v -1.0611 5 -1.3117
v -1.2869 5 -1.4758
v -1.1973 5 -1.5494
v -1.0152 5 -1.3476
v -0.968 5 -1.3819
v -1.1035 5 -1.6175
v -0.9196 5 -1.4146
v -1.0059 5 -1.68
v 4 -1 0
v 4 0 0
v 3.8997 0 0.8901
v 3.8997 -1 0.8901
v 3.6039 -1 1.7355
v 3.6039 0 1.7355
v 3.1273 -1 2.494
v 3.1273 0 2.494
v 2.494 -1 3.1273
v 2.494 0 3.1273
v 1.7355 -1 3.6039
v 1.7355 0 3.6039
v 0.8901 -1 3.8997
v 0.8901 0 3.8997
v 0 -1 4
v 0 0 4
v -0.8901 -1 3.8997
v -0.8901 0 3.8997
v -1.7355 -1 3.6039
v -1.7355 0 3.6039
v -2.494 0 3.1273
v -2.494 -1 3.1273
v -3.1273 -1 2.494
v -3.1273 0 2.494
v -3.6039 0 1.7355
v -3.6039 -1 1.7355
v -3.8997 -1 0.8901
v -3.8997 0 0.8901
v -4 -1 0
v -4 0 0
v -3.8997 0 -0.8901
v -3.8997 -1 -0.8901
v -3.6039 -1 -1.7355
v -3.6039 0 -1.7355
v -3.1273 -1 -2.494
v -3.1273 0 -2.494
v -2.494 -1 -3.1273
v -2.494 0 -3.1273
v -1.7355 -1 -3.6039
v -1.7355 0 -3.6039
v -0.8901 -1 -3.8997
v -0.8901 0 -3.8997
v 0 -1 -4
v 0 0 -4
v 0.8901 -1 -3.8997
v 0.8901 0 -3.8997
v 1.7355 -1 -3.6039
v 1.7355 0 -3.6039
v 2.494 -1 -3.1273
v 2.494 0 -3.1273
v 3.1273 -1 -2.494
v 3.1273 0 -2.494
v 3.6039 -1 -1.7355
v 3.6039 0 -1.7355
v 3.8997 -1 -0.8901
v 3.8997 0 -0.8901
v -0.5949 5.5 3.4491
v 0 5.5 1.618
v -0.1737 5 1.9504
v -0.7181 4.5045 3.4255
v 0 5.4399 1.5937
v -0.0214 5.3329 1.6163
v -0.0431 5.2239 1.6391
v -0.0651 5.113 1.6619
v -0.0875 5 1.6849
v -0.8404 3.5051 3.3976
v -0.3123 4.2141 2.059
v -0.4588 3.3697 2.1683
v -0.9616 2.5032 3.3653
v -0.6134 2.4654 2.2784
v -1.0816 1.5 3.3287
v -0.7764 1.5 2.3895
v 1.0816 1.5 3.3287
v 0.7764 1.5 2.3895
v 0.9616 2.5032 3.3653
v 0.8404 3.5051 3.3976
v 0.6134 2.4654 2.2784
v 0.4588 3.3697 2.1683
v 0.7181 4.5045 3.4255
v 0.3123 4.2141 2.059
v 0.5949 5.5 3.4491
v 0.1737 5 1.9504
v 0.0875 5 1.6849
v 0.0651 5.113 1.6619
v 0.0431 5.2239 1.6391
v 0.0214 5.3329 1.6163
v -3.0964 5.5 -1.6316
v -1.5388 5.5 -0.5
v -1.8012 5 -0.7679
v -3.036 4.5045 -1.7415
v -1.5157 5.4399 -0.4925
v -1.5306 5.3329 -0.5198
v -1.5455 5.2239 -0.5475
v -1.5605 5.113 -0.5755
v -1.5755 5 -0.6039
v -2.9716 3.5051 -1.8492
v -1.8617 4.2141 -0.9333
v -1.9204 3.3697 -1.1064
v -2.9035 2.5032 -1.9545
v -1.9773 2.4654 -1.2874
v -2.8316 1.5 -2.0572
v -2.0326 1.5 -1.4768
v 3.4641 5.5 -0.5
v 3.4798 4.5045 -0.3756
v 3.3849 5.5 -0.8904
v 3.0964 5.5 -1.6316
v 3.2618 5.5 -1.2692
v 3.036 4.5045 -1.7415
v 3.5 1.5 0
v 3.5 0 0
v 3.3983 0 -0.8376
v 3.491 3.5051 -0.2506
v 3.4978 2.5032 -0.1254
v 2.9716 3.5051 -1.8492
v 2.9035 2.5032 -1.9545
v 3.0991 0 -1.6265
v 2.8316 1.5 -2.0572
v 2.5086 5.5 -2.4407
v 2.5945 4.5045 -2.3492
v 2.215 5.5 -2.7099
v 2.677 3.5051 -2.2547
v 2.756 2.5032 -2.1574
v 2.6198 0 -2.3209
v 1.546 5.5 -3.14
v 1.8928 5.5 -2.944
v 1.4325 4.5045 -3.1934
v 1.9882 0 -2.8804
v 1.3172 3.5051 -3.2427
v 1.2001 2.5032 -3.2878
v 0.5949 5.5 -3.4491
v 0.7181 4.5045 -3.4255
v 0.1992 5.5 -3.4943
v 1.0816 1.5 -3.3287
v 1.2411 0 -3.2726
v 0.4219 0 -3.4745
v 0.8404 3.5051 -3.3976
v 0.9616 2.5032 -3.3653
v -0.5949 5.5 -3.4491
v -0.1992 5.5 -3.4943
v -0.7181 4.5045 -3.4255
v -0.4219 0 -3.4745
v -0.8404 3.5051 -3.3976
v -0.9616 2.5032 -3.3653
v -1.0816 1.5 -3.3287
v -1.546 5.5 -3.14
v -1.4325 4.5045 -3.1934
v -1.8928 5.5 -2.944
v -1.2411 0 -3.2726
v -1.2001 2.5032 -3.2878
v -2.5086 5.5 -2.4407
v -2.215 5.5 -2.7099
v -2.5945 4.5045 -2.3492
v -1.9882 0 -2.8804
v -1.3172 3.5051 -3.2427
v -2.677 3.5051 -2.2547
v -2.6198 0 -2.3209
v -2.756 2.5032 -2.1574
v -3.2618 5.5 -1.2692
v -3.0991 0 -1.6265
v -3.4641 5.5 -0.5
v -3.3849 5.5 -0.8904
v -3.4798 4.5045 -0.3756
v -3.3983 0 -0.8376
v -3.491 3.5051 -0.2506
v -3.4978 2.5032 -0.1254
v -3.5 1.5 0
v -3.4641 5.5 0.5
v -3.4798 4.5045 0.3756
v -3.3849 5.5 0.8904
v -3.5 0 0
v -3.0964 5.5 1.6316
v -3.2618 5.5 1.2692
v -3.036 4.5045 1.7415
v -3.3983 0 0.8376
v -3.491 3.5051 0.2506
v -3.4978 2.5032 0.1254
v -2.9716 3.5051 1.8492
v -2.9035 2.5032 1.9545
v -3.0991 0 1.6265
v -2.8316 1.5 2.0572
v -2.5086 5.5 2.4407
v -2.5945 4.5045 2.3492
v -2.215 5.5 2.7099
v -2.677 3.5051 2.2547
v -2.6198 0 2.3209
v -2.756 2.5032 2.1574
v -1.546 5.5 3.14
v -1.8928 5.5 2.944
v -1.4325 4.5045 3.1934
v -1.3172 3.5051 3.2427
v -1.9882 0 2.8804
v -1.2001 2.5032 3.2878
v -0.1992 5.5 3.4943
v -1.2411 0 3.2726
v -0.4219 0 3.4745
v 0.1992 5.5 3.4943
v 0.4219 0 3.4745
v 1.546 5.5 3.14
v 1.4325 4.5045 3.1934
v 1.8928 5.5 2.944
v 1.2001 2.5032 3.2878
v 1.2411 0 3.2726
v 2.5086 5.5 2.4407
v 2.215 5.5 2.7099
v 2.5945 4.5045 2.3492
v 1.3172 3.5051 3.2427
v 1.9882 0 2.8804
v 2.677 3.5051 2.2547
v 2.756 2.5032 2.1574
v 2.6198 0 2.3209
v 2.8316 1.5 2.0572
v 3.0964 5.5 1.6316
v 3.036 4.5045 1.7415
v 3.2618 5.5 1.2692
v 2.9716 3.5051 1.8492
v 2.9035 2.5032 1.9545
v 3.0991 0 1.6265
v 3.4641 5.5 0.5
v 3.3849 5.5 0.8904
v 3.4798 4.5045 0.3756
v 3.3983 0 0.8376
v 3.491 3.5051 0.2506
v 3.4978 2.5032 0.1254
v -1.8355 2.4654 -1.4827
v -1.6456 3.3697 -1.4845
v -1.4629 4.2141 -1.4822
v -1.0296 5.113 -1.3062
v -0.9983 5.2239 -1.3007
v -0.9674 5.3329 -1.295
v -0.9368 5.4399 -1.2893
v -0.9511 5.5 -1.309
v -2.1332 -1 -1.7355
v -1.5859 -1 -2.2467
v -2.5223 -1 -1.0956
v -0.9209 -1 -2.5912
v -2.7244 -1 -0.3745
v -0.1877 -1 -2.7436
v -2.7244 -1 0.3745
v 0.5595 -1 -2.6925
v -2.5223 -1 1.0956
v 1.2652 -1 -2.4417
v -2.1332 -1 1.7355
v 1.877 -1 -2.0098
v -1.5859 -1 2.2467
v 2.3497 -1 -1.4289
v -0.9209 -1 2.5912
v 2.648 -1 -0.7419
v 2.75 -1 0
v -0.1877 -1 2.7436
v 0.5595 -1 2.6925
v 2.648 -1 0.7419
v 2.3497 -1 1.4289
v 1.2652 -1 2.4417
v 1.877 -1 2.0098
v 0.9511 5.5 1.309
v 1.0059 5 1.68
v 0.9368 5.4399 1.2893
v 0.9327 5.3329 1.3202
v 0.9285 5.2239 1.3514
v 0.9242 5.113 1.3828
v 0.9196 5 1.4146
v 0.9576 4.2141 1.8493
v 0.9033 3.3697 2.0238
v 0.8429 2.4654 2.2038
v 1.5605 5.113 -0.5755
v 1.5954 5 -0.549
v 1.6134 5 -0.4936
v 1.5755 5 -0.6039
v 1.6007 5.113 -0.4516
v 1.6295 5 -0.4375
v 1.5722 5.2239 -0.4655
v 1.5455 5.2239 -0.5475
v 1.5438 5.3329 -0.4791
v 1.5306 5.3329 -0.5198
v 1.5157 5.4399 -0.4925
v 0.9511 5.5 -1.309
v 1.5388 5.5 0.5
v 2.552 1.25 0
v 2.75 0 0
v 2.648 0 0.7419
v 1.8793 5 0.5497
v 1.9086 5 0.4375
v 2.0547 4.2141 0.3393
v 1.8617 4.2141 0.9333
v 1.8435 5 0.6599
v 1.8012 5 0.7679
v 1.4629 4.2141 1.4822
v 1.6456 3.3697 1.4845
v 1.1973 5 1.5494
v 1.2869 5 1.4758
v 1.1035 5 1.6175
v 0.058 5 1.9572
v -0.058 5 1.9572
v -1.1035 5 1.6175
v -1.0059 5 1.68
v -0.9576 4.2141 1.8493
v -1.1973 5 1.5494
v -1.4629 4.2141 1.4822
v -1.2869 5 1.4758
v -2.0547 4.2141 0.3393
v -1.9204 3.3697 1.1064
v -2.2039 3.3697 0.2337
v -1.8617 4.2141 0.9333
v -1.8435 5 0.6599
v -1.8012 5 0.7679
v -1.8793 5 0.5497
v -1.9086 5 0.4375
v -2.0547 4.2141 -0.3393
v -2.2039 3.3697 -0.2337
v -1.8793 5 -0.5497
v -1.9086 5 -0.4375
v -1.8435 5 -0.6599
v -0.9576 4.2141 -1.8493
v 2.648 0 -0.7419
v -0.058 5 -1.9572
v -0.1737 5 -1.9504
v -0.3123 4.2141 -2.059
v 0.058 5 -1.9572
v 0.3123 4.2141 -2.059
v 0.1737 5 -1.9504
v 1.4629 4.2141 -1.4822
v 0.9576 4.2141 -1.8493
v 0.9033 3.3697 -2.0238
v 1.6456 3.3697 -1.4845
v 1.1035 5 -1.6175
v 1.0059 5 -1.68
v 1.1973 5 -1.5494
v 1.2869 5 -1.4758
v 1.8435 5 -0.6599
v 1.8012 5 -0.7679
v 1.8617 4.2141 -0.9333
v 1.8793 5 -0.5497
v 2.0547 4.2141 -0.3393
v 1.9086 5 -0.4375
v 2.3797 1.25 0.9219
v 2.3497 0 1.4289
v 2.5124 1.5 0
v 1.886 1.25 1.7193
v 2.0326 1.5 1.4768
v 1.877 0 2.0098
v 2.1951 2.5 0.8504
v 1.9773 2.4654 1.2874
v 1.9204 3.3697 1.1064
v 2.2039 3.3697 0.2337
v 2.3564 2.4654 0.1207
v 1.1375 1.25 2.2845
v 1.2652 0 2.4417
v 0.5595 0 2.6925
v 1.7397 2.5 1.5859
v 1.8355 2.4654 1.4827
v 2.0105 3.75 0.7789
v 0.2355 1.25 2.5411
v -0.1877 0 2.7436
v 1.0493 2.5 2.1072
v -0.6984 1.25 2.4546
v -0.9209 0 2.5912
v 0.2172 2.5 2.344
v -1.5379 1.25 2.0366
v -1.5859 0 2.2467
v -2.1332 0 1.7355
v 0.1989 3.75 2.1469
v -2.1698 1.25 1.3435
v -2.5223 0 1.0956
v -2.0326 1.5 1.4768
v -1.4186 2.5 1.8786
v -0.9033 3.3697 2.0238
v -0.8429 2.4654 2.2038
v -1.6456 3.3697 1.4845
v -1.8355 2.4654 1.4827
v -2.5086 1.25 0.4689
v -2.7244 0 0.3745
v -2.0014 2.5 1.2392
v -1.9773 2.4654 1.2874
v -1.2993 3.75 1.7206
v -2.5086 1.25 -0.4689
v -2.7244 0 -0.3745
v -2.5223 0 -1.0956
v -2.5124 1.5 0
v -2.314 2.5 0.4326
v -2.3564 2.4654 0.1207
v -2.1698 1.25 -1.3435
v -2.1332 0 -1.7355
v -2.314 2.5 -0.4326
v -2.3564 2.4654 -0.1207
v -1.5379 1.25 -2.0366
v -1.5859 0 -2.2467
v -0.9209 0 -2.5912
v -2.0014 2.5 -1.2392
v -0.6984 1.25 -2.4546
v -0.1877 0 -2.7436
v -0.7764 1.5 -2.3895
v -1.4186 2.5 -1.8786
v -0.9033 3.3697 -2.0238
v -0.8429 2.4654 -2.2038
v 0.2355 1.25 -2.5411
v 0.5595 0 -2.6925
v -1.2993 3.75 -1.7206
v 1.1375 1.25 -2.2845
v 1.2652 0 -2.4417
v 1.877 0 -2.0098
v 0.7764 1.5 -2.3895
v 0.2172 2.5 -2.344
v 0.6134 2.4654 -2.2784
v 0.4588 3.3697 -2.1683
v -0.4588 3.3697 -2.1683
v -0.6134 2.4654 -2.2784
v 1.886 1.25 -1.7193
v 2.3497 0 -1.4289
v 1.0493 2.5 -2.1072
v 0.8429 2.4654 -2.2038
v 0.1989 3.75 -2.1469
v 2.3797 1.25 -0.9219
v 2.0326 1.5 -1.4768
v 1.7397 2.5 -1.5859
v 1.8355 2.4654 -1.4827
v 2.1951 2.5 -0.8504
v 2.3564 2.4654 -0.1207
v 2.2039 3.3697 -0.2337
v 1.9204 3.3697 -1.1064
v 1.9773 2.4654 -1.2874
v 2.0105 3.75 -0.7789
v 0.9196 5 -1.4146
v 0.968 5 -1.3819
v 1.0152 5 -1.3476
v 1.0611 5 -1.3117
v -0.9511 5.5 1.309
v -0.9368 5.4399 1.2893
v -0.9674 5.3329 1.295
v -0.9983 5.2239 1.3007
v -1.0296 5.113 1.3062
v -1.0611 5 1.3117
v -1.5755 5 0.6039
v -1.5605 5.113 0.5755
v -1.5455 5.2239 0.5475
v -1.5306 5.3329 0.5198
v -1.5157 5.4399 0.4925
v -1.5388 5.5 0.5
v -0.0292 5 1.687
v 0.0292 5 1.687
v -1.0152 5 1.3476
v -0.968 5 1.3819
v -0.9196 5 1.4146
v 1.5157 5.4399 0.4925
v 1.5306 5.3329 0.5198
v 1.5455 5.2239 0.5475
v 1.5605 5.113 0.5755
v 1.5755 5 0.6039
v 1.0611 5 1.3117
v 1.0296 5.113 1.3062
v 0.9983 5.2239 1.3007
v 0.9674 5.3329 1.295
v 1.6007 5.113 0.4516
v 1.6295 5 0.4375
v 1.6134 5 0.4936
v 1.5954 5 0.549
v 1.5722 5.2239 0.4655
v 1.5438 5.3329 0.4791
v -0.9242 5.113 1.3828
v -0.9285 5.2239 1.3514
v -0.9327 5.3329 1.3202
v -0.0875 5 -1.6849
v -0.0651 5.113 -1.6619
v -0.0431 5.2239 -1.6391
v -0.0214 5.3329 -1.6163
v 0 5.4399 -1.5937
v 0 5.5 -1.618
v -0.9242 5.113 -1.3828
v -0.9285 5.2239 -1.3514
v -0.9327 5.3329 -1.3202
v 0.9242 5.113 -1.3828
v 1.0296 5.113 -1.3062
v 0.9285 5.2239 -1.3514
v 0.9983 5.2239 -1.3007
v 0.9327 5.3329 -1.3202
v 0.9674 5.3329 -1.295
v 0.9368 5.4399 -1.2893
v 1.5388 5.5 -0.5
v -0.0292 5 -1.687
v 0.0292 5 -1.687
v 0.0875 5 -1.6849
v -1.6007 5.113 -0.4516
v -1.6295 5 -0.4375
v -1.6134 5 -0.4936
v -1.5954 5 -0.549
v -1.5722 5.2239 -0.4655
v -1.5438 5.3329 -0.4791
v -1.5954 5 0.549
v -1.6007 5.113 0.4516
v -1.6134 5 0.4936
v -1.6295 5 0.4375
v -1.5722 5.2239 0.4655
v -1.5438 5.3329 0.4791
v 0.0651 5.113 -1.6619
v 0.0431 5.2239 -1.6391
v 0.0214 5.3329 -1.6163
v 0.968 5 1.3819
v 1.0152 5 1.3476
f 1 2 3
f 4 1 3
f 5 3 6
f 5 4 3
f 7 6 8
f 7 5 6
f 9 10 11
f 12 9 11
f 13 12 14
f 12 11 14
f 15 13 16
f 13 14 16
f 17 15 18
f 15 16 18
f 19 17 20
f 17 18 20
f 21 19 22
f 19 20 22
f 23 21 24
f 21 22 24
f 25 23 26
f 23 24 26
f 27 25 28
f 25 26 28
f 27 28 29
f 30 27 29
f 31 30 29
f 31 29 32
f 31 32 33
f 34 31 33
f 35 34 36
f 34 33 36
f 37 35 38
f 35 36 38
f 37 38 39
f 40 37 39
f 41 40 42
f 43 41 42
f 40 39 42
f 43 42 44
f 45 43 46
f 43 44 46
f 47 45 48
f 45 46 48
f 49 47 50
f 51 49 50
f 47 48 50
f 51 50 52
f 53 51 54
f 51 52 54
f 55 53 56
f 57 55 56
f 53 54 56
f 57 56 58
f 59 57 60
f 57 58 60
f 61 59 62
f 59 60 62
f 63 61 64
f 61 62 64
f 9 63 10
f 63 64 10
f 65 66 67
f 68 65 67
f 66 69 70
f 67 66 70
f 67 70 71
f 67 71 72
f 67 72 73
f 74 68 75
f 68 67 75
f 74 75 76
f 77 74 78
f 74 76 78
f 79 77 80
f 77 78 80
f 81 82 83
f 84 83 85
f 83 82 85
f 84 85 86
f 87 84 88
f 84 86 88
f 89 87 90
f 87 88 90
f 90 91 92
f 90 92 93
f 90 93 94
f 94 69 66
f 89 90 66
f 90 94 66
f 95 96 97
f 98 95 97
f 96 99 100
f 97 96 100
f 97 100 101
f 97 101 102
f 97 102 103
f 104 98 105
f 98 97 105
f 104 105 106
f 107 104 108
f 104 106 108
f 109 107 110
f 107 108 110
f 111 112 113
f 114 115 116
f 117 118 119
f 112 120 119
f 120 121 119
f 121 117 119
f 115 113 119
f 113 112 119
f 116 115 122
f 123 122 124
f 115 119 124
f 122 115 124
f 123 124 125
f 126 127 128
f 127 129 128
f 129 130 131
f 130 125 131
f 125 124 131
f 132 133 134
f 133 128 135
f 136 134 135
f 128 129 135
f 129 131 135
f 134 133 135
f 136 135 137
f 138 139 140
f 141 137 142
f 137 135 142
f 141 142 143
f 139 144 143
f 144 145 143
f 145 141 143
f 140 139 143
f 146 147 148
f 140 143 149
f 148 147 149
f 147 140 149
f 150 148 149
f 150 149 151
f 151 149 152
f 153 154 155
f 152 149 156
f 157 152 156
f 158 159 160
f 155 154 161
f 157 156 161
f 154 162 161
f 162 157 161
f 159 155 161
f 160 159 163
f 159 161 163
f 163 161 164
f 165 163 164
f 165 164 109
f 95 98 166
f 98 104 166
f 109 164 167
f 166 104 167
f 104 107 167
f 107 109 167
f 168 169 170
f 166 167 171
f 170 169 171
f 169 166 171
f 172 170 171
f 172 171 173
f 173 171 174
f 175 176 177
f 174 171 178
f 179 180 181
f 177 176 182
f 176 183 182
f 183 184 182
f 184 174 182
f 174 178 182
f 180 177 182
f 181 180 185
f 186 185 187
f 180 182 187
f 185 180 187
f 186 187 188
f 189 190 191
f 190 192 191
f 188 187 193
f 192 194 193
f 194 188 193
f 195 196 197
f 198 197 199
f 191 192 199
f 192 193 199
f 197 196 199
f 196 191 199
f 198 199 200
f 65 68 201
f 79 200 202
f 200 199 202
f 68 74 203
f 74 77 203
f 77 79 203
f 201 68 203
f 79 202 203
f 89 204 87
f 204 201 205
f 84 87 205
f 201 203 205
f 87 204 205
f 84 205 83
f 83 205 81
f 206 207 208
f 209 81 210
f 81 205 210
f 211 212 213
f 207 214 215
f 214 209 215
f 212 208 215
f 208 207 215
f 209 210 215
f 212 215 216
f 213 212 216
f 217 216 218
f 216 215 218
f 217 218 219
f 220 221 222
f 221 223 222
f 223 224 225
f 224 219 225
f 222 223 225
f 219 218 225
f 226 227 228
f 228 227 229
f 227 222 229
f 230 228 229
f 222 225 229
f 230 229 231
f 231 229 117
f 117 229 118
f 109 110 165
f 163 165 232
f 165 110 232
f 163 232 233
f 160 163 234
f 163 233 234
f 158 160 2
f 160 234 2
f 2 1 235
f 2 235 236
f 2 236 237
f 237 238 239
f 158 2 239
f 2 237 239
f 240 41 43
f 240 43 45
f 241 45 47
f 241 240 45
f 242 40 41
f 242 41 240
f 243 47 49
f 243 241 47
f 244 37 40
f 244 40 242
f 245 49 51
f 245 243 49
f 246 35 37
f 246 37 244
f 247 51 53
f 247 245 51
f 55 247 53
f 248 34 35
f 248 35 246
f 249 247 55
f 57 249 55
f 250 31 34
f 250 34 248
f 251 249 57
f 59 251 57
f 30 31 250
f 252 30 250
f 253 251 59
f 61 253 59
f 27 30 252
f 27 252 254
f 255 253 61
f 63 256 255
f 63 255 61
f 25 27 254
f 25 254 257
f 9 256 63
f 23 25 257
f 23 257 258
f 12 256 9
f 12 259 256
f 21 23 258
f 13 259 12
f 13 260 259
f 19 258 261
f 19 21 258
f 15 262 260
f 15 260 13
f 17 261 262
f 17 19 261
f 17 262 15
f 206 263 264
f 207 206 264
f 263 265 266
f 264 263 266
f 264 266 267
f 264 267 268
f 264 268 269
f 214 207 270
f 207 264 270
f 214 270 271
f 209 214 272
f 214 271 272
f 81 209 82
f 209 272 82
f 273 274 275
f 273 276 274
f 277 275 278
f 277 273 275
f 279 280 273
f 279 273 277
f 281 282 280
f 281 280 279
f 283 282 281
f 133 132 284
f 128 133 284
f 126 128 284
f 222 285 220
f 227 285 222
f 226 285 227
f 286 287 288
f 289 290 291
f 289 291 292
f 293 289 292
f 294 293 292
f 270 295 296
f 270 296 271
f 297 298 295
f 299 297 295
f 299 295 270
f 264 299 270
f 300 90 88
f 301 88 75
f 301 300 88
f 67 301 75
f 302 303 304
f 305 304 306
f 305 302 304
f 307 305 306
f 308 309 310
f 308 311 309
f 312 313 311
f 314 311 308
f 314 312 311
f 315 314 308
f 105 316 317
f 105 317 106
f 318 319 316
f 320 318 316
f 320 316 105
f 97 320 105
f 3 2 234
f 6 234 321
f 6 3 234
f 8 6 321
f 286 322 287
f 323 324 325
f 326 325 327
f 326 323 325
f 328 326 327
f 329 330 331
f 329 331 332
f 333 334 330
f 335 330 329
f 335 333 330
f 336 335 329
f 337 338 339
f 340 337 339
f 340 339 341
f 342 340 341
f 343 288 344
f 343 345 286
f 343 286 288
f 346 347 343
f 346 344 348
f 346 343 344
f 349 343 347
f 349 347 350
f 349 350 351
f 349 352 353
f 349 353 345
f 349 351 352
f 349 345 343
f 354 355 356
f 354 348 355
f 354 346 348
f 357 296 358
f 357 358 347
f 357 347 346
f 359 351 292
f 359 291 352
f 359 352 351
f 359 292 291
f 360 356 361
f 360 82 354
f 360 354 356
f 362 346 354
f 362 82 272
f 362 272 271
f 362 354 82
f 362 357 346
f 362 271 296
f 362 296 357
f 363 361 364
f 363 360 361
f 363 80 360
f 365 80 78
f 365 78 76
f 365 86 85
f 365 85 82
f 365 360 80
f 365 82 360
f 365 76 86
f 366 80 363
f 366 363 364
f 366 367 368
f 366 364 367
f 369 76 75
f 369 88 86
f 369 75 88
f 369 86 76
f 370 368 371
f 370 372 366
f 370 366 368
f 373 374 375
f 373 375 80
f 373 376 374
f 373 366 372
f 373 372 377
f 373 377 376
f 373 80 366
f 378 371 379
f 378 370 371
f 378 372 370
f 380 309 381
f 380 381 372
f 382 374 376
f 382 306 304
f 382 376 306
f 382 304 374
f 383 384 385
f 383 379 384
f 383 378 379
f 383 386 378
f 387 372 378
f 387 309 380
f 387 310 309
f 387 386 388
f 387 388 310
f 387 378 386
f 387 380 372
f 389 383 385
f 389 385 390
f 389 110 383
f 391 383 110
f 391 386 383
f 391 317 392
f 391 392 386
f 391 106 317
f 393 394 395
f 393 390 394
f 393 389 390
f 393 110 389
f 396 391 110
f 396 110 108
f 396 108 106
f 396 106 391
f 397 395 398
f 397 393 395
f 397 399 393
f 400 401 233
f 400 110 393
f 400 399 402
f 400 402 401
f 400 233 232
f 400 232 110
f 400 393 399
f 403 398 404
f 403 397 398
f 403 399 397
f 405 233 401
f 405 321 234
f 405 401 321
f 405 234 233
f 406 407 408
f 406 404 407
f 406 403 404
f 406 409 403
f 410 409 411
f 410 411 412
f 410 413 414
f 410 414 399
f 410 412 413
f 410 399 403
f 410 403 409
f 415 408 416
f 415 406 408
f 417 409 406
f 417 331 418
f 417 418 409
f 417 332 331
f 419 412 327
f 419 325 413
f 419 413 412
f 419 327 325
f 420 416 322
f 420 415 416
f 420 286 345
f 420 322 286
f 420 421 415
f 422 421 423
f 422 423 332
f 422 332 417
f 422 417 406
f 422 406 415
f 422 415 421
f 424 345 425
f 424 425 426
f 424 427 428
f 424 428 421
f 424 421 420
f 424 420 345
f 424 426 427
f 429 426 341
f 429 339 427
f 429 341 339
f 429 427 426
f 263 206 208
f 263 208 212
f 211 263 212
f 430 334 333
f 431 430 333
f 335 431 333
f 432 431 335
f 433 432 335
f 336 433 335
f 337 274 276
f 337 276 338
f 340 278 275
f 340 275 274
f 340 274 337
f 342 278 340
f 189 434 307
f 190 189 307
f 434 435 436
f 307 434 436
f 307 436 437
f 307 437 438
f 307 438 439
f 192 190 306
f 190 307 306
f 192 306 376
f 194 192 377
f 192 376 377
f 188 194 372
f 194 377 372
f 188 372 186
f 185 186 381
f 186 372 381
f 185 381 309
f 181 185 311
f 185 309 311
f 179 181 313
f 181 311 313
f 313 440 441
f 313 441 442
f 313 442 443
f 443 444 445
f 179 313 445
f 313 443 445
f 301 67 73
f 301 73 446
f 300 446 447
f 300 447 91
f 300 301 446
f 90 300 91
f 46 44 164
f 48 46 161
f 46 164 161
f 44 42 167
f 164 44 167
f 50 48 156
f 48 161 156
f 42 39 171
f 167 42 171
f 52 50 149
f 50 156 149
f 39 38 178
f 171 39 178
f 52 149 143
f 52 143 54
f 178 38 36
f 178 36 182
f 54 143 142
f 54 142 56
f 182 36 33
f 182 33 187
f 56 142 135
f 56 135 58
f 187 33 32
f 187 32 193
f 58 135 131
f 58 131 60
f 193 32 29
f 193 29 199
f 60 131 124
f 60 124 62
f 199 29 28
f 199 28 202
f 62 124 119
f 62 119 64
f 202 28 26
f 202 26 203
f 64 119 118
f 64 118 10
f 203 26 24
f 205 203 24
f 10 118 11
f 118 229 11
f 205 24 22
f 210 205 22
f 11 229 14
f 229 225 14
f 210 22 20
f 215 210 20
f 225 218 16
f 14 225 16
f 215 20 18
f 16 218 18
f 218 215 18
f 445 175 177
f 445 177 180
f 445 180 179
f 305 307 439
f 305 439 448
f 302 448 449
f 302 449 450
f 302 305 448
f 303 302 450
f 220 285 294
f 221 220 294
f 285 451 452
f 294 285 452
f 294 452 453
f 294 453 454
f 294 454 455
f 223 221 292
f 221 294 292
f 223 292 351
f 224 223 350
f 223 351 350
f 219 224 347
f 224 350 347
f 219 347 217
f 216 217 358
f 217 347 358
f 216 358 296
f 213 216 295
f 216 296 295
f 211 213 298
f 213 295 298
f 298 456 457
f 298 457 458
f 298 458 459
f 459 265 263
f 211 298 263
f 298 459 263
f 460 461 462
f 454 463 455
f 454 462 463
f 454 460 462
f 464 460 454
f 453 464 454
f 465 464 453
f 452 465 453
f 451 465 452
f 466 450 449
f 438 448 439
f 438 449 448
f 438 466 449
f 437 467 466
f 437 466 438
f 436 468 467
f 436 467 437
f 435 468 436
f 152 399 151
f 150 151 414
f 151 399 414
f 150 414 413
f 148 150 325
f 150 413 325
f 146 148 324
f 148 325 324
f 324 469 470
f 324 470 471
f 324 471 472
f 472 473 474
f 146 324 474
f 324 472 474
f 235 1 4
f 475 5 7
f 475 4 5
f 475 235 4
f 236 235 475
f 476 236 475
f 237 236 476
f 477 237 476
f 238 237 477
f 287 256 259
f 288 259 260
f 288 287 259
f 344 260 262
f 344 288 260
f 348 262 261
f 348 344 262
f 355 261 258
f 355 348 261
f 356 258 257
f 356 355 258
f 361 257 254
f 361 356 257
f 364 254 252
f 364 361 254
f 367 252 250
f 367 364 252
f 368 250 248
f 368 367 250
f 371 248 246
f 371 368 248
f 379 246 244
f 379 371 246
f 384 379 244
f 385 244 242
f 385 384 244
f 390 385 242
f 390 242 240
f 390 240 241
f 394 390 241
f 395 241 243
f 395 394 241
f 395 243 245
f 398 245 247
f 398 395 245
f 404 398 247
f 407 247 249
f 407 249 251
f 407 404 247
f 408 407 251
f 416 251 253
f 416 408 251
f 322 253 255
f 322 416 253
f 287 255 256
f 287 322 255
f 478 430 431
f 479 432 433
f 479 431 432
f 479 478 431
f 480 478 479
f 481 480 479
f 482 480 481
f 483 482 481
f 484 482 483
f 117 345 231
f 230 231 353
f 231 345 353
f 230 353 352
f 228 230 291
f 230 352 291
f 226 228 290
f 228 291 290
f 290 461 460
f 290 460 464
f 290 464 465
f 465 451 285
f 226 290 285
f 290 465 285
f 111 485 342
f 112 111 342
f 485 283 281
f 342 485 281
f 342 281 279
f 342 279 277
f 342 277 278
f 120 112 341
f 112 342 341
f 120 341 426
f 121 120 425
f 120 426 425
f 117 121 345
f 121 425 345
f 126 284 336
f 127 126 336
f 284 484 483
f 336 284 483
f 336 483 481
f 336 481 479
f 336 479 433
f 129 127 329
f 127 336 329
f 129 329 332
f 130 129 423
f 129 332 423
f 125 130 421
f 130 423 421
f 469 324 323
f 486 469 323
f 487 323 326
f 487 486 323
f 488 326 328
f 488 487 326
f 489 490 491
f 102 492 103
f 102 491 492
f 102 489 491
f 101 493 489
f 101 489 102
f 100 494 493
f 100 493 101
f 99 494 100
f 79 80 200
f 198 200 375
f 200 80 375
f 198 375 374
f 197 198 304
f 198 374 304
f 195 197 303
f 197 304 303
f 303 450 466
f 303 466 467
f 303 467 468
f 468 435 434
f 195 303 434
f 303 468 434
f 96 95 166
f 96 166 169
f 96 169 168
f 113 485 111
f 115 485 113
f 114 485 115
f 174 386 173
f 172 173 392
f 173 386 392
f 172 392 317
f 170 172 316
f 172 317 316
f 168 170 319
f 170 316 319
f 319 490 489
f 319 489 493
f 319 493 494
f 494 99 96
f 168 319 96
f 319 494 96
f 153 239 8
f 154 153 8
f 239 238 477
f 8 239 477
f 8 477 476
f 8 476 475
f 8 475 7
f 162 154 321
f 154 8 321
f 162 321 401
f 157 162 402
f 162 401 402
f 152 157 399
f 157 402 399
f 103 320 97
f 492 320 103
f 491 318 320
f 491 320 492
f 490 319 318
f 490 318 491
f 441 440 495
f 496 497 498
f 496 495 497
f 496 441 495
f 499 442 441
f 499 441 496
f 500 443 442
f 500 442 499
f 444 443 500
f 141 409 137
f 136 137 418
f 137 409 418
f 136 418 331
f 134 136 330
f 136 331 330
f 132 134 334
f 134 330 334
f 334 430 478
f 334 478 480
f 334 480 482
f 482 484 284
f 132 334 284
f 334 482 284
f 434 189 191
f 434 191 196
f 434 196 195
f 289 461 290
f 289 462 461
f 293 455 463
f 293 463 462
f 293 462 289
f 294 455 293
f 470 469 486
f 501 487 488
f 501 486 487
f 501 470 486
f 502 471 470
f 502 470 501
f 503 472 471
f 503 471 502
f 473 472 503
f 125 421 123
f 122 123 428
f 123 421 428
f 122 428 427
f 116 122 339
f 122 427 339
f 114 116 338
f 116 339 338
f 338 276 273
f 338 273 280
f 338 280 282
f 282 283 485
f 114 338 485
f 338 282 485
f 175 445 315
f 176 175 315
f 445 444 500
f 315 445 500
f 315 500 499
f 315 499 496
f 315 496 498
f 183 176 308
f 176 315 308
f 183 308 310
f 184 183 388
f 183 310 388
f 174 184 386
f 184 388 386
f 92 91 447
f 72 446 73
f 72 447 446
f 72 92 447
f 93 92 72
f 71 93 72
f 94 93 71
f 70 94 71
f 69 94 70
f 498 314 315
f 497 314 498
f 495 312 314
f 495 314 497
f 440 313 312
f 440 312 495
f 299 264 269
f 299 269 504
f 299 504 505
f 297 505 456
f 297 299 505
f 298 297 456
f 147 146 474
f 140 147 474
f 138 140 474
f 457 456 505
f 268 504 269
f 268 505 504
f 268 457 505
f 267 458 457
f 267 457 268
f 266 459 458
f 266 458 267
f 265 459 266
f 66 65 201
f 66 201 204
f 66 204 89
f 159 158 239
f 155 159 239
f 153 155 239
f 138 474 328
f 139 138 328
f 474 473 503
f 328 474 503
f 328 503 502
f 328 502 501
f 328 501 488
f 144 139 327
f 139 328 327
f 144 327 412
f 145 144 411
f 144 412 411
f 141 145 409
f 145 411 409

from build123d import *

# Parameters (mm, degrees)
SKETCH1_R           = 3.5
BOSS_EXTRUDE1_DEPTH = 5.5
SKETCH2_R           = 2.75
CUT_EXTRUDE1_DEPTH  = 5.5
CUT_EXTRUDE1_TAPER  = 12
CUT_EXTRUDE2_DEPTH  = 5.5
CIRPATTERN1_COUNT   = 10
SKETCH4_R           = 2.75
CUT_EXTRUDE3_DEPTH  = 5
CUT_EXTRUDE3_TAPER  = 9
SKETCH5_R           = 4
SKETCH5_R_2         = 3.5
SKETCH5_R_3         = 2.75
BOSS_EXTRUDE2_DEPTH = 1


with BuildPart() as part:
    # Sketch1 → Boss-Extrude1 (new body)
    with BuildSketch(Plane(origin=(0, 0, 0), x_dir=(1, 0, 0), z_dir=(0, 1, 0))):
        Circle(SKETCH1_R)
    extrude(amount=BOSS_EXTRUDE1_DEPTH)

    # Sketch2 → Cut-Extrude1 (cut)
    with BuildSketch(Plane.XZ):
        Circle(SKETCH2_R)
    extrude(amount=-CUT_EXTRUDE1_DEPTH, taper=CUT_EXTRUDE1_TAPER, mode=Mode.SUBTRACT)

    # Sketch3 → Cut-Extrude2 (cut)
    with BuildSketch(Plane(origin=(0, 0, 0), x_dir=(0, 0, -1), z_dir=(1, 0, 0))):
        Polygon((-0.5, 5.5), (-0.35, 4.3), (0, 1.5), (0.35, 4.3), (0.5, 5.5), align=None)
    cut_extrude2 = extrude(amount=-CUT_EXTRUDE2_DEPTH, mode=Mode.SUBTRACT)

    # CirPattern1: Cut-Extrude2 ×10 about axis
    cirpattern1_axis = Axis((0, 5.5, 0), (0, -1, 0))
    for i in range(1, CIRPATTERN1_COUNT):
        add(cut_extrude2.rotate(cirpattern1_axis, i * 360 / CIRPATTERN1_COUNT), mode=Mode.SUBTRACT)

    # Sketch4 → Cut-Extrude3 (cut)
    with BuildSketch(Plane.XZ):
        Circle(SKETCH4_R)
    extrude(amount=-CUT_EXTRUDE3_DEPTH, taper=CUT_EXTRUDE3_TAPER, mode=Mode.SUBTRACT)

    # Sketch5 → Boss-Extrude2 (add)
    with BuildSketch(Plane.XZ):
        Circle(SKETCH5_R)
        Circle(SKETCH5_R_2, mode=Mode.SUBTRACT)
        Circle(SKETCH5_R_2)
        Circle(SKETCH5_R_3, mode=Mode.SUBTRACT)
    extrude(amount=BOSS_EXTRUDE2_DEPTH)


solid = part.part
